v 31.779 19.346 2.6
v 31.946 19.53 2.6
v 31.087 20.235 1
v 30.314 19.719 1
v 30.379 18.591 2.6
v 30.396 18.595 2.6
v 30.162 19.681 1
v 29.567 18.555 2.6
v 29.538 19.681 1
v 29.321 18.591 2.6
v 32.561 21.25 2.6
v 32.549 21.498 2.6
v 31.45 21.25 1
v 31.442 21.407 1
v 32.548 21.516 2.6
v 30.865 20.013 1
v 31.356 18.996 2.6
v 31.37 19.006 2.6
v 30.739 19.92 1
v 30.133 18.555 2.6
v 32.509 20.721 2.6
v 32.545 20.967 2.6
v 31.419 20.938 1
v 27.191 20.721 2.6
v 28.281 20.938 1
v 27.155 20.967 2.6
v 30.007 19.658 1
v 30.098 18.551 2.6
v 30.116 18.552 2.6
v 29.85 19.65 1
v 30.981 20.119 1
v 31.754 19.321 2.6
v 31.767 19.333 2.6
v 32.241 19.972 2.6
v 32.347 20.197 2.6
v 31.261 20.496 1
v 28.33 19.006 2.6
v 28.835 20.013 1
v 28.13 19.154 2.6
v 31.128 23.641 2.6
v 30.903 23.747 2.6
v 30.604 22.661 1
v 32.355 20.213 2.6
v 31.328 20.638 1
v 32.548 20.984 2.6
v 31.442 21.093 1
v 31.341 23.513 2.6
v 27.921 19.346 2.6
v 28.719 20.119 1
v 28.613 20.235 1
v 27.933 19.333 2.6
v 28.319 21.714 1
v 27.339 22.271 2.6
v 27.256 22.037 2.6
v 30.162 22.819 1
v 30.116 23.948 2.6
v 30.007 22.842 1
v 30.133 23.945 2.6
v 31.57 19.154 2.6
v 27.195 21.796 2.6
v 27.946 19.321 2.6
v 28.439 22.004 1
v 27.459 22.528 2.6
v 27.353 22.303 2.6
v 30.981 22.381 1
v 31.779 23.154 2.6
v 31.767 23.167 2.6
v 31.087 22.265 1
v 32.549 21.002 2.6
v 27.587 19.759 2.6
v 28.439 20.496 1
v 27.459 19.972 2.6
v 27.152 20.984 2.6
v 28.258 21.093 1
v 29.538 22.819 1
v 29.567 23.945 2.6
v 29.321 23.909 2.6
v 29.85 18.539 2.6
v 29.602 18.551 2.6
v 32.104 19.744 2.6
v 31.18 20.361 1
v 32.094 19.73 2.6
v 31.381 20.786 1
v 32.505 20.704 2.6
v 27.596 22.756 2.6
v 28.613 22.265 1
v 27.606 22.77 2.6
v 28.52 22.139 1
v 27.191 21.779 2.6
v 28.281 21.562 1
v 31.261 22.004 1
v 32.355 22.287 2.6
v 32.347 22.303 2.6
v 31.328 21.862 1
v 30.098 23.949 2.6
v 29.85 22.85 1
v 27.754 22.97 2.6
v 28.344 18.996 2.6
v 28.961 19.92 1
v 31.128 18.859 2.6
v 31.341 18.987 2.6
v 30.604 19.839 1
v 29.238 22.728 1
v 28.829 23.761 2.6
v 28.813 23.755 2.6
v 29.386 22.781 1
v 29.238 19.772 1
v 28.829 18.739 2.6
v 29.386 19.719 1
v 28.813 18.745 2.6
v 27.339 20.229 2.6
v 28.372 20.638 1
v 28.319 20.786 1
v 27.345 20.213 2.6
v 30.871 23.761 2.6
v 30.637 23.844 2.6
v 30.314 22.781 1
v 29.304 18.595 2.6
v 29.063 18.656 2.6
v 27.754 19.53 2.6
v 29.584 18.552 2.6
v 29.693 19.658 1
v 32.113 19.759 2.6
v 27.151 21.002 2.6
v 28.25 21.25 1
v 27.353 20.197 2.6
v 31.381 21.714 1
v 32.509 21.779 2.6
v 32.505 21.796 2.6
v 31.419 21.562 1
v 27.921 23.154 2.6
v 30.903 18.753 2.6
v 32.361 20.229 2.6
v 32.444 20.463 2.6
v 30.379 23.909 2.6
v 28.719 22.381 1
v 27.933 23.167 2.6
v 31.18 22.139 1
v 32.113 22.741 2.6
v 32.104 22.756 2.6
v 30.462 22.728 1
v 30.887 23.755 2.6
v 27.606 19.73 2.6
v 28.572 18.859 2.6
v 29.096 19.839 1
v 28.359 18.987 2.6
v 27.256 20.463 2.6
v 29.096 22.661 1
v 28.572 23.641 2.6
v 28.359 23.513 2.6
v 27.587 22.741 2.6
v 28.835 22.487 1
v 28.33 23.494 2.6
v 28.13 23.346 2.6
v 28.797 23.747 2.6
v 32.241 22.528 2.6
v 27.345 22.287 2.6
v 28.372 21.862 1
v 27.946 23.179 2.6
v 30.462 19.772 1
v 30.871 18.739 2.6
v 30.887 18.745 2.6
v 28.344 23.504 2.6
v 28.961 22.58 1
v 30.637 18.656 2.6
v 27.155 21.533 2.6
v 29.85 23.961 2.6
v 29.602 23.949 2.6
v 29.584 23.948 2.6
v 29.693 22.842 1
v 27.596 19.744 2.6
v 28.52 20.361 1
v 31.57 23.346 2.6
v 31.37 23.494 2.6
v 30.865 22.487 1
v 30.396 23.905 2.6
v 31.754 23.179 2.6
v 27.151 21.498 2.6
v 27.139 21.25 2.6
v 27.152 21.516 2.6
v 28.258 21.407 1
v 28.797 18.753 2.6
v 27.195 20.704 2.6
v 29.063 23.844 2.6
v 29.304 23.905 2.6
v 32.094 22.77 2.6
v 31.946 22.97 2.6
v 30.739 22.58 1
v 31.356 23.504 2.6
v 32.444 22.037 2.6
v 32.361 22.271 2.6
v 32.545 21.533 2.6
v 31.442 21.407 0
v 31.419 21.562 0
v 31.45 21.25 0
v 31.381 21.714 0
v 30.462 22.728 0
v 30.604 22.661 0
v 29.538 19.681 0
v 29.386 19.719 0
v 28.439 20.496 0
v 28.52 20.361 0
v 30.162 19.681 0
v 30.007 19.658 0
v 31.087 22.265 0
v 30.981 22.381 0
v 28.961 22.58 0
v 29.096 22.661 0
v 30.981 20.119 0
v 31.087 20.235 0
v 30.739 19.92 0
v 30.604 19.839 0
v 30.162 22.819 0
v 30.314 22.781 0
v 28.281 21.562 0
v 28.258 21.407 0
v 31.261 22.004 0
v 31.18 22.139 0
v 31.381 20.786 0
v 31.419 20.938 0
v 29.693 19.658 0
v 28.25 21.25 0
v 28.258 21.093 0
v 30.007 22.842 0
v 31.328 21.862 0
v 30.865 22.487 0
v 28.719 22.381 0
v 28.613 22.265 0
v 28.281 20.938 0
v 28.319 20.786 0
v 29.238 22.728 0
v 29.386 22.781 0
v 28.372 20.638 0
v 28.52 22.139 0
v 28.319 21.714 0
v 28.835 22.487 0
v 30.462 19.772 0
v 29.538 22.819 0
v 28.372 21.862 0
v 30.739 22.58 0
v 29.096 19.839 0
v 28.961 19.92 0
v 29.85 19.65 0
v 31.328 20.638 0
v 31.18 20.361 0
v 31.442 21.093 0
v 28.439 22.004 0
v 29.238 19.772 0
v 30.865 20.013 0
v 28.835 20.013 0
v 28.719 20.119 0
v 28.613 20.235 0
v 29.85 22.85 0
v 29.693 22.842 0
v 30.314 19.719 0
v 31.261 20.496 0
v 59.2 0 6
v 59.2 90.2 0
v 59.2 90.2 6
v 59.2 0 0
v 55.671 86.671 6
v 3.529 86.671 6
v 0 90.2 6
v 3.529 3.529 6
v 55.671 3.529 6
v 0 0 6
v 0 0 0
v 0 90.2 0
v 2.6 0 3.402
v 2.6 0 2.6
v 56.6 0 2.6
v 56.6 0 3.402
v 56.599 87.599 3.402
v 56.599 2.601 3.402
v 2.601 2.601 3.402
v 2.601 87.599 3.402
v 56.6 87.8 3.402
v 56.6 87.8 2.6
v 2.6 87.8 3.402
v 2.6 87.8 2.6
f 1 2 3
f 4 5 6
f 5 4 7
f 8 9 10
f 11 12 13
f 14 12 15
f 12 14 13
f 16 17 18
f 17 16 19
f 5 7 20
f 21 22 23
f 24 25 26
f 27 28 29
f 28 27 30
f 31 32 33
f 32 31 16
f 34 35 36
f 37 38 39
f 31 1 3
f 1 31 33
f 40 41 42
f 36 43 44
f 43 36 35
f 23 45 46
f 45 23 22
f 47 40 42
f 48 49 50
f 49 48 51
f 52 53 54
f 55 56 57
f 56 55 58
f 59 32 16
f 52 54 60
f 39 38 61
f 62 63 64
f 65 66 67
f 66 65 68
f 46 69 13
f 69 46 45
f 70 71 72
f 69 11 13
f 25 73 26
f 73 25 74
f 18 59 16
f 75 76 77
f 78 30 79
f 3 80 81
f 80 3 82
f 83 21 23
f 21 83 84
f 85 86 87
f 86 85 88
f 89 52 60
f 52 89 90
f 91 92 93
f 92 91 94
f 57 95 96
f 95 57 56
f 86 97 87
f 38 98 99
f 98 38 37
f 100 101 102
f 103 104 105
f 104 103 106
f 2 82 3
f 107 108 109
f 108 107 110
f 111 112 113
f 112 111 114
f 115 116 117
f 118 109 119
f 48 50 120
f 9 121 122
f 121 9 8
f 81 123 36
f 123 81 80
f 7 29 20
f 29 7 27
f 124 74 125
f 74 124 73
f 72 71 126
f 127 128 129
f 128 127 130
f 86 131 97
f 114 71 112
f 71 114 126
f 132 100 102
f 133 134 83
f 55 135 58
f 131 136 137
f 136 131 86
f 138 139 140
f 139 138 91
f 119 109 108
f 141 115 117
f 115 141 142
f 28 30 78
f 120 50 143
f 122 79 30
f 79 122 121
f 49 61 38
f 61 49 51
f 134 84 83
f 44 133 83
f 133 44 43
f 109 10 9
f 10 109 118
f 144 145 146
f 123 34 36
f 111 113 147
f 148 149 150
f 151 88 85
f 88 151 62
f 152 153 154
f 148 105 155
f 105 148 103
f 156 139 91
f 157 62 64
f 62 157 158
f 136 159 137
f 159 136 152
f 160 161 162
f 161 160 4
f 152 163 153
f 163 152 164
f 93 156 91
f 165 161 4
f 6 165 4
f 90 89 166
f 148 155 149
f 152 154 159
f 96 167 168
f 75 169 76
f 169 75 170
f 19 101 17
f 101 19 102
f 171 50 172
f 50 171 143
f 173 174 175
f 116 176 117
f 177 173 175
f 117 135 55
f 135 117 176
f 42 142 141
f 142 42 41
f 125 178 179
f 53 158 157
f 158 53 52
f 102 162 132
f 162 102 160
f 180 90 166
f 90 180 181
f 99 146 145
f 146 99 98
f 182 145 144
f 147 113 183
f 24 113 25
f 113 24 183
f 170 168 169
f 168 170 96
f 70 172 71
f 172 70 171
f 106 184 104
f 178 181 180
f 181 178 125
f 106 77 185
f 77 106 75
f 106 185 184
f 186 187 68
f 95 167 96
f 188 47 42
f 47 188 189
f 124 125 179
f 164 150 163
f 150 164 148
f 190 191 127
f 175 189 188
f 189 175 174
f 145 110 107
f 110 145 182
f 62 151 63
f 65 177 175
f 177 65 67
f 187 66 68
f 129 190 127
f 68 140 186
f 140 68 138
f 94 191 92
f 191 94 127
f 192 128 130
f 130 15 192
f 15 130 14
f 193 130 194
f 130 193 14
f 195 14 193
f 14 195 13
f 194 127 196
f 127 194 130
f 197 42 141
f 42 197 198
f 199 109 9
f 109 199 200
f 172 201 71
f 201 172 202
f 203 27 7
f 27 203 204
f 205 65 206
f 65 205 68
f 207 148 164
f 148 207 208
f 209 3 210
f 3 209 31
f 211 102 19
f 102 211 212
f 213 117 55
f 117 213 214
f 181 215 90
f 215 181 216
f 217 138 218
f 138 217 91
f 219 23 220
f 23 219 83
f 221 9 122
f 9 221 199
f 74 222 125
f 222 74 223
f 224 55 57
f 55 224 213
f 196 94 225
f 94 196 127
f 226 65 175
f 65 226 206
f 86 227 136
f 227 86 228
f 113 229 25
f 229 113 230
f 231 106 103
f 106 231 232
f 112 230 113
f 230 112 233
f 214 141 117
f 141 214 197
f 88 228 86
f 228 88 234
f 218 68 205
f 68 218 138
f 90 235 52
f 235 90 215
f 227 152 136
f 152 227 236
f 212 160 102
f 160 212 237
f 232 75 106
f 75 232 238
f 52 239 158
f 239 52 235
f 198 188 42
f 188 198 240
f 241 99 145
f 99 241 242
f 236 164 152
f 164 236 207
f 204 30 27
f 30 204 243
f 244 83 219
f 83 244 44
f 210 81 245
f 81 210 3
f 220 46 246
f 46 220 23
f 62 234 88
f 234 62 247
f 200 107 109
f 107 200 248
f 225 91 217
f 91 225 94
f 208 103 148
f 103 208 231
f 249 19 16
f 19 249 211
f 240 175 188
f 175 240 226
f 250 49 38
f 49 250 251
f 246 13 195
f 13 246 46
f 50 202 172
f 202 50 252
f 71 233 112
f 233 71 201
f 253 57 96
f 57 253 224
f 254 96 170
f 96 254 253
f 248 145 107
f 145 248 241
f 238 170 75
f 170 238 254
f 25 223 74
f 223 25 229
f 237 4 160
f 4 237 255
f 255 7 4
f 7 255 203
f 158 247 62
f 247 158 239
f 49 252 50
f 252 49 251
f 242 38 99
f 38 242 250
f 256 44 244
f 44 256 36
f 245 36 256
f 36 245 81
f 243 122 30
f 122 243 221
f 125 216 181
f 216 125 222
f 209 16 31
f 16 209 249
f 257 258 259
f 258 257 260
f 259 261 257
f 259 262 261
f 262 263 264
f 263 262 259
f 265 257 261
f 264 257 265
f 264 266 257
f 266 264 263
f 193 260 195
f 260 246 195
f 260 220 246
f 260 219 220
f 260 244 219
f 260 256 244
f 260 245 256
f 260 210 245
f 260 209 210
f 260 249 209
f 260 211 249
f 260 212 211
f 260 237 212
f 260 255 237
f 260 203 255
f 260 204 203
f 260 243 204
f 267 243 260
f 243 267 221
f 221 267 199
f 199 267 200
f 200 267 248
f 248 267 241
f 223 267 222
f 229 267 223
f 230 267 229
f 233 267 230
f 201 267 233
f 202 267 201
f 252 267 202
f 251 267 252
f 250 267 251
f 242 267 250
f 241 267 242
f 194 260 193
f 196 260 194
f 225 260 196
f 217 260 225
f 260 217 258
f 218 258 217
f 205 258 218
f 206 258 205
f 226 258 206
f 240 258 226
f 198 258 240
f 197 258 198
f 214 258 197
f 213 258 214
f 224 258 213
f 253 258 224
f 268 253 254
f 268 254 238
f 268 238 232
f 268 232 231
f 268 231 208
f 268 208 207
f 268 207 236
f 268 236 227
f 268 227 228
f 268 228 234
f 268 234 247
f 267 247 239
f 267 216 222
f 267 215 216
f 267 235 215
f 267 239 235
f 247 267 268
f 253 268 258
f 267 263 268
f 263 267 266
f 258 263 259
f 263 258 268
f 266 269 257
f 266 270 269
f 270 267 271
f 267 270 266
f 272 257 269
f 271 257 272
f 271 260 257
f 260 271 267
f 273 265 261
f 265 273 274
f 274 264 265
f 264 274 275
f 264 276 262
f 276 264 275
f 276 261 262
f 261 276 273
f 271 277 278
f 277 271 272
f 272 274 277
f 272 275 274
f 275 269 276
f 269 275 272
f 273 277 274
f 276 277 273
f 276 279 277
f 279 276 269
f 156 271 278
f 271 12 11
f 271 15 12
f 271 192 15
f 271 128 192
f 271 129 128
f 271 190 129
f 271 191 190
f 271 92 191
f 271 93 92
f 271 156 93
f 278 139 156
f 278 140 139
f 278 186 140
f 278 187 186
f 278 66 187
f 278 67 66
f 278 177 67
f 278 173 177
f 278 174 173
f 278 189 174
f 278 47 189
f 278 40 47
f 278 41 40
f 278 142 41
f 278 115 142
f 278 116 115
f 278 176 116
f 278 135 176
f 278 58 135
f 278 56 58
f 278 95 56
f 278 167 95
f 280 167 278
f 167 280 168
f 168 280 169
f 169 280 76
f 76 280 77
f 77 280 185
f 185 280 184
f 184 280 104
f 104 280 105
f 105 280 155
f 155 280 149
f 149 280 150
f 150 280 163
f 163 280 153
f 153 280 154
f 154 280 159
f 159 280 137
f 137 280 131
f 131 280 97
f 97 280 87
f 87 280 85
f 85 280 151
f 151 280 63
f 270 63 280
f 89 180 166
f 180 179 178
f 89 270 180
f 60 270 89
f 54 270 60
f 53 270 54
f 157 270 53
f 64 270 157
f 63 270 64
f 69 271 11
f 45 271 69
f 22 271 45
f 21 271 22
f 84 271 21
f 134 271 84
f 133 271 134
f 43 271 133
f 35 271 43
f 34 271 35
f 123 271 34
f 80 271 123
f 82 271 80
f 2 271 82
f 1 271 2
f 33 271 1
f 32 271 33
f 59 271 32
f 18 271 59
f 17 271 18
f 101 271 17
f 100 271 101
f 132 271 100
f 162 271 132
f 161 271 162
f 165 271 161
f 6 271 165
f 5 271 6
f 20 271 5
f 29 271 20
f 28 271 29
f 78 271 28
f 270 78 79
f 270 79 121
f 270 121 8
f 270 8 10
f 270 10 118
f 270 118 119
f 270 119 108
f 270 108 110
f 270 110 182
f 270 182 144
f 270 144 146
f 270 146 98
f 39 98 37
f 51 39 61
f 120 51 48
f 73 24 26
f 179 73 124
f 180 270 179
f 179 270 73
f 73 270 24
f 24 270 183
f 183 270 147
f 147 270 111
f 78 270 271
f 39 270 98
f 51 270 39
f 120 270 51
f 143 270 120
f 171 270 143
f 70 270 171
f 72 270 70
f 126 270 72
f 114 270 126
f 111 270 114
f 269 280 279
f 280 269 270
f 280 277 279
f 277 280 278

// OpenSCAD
$fn = $preview ? 32 : 64;
//variables
cutOut = 0.2;
frameWallThickness = 2.4;

polaroidOuterX = 54;
polaroidOuterY = 85;
polaroidOuterZ = 0.8;

frameOuterX = polaroidOuterX+frameWallThickness*2+cutOut*2;
frameOuterY = polaroidOuterY+frameWallThickness*2+cutOut*2;
frameOuterZ = polaroidOuterZ+frameWallThickness*2+cutOut*2;

polyhedronCutOutZ = frameOuterZ-frameWallThickness-polaroidOuterZ;
polyhedronCutOutTaper = 1;

//counter sunk screw type: M3 DIN 7982-Torx
screwHeadHeight = 1.6+cutOut;
mountingHoleHeight = frameWallThickness+cutOut;
mountingHoleMinDiameter = 3+cutOut;
mountingHoleMaxDiameter = 5.5+cutOut;
mountingHoleOffsetX = polaroidOuterX/2+mountingHoleMaxDiameter/2;
mountingHoleOffsetY = polaroidOuterY/4;


//moduls
module frame(){
	
	difference(){
		
		cube([frameOuterX,frameOuterY,frameOuterZ]);
		
		translate([frameWallThickness+cutOut,
				frameWallThickness+cutOut,
				frameWallThickness+polaroidOuterZ+cutOut]){
			
			CubePoints = [
			[0,0,0],  
			[polaroidOuterX,0,0],  
			[polaroidOuterX,polaroidOuterY,0],  
			[0,polaroidOuterY,0],  
			[polyhedronCutOutTaper,polyhedronCutOutTaper,polyhedronCutOutZ],  
			[polaroidOuterX-polyhedronCutOutTaper,polyhedronCutOutTaper,polyhedronCutOutZ],  
			[ polaroidOuterX-polyhedronCutOutTaper,polaroidOuterY-polyhedronCutOutTaper,polyhedronCutOutZ],  
			[polyhedronCutOutTaper,polaroidOuterY-polyhedronCutOutTaper,polyhedronCutOutZ]
			]; 
  
			CubeFaces = [
			[0,1,2,3],  
			[4,5,1,0],  
			[7,6,5,4],  
			[5,6,2,1], 
			[6,7,3,2],  
			[7,4,0,3]]; 
  
			polyhedron(CubePoints,CubeFaces);
		}
		translate([frameWallThickness+cutOut,-cutOut,frameWallThickness+cutOut]){
			
			cube([polaroidOuterX,polaroidOuterY+frameWallThickness+cutOut*3,polaroidOuterZ+cutOut/100]);
		}
		
		translate([mountingHoleOffsetX,mountingHoleOffsetY,mountingHoleHeight-screwHeadHeight+cutOut]){
			
			cylinder(h=screwHeadHeight,d1=mountingHoleMinDiameter, d2=mountingHoleMaxDiameter);
			
			translate([0,0,-mountingHoleHeight+screwHeadHeight-cutOut*2])
			
				cylinder(h=mountingHoleHeight,d=mountingHoleMinDiameter);
		}	
	}
}


//callBack

frame();
